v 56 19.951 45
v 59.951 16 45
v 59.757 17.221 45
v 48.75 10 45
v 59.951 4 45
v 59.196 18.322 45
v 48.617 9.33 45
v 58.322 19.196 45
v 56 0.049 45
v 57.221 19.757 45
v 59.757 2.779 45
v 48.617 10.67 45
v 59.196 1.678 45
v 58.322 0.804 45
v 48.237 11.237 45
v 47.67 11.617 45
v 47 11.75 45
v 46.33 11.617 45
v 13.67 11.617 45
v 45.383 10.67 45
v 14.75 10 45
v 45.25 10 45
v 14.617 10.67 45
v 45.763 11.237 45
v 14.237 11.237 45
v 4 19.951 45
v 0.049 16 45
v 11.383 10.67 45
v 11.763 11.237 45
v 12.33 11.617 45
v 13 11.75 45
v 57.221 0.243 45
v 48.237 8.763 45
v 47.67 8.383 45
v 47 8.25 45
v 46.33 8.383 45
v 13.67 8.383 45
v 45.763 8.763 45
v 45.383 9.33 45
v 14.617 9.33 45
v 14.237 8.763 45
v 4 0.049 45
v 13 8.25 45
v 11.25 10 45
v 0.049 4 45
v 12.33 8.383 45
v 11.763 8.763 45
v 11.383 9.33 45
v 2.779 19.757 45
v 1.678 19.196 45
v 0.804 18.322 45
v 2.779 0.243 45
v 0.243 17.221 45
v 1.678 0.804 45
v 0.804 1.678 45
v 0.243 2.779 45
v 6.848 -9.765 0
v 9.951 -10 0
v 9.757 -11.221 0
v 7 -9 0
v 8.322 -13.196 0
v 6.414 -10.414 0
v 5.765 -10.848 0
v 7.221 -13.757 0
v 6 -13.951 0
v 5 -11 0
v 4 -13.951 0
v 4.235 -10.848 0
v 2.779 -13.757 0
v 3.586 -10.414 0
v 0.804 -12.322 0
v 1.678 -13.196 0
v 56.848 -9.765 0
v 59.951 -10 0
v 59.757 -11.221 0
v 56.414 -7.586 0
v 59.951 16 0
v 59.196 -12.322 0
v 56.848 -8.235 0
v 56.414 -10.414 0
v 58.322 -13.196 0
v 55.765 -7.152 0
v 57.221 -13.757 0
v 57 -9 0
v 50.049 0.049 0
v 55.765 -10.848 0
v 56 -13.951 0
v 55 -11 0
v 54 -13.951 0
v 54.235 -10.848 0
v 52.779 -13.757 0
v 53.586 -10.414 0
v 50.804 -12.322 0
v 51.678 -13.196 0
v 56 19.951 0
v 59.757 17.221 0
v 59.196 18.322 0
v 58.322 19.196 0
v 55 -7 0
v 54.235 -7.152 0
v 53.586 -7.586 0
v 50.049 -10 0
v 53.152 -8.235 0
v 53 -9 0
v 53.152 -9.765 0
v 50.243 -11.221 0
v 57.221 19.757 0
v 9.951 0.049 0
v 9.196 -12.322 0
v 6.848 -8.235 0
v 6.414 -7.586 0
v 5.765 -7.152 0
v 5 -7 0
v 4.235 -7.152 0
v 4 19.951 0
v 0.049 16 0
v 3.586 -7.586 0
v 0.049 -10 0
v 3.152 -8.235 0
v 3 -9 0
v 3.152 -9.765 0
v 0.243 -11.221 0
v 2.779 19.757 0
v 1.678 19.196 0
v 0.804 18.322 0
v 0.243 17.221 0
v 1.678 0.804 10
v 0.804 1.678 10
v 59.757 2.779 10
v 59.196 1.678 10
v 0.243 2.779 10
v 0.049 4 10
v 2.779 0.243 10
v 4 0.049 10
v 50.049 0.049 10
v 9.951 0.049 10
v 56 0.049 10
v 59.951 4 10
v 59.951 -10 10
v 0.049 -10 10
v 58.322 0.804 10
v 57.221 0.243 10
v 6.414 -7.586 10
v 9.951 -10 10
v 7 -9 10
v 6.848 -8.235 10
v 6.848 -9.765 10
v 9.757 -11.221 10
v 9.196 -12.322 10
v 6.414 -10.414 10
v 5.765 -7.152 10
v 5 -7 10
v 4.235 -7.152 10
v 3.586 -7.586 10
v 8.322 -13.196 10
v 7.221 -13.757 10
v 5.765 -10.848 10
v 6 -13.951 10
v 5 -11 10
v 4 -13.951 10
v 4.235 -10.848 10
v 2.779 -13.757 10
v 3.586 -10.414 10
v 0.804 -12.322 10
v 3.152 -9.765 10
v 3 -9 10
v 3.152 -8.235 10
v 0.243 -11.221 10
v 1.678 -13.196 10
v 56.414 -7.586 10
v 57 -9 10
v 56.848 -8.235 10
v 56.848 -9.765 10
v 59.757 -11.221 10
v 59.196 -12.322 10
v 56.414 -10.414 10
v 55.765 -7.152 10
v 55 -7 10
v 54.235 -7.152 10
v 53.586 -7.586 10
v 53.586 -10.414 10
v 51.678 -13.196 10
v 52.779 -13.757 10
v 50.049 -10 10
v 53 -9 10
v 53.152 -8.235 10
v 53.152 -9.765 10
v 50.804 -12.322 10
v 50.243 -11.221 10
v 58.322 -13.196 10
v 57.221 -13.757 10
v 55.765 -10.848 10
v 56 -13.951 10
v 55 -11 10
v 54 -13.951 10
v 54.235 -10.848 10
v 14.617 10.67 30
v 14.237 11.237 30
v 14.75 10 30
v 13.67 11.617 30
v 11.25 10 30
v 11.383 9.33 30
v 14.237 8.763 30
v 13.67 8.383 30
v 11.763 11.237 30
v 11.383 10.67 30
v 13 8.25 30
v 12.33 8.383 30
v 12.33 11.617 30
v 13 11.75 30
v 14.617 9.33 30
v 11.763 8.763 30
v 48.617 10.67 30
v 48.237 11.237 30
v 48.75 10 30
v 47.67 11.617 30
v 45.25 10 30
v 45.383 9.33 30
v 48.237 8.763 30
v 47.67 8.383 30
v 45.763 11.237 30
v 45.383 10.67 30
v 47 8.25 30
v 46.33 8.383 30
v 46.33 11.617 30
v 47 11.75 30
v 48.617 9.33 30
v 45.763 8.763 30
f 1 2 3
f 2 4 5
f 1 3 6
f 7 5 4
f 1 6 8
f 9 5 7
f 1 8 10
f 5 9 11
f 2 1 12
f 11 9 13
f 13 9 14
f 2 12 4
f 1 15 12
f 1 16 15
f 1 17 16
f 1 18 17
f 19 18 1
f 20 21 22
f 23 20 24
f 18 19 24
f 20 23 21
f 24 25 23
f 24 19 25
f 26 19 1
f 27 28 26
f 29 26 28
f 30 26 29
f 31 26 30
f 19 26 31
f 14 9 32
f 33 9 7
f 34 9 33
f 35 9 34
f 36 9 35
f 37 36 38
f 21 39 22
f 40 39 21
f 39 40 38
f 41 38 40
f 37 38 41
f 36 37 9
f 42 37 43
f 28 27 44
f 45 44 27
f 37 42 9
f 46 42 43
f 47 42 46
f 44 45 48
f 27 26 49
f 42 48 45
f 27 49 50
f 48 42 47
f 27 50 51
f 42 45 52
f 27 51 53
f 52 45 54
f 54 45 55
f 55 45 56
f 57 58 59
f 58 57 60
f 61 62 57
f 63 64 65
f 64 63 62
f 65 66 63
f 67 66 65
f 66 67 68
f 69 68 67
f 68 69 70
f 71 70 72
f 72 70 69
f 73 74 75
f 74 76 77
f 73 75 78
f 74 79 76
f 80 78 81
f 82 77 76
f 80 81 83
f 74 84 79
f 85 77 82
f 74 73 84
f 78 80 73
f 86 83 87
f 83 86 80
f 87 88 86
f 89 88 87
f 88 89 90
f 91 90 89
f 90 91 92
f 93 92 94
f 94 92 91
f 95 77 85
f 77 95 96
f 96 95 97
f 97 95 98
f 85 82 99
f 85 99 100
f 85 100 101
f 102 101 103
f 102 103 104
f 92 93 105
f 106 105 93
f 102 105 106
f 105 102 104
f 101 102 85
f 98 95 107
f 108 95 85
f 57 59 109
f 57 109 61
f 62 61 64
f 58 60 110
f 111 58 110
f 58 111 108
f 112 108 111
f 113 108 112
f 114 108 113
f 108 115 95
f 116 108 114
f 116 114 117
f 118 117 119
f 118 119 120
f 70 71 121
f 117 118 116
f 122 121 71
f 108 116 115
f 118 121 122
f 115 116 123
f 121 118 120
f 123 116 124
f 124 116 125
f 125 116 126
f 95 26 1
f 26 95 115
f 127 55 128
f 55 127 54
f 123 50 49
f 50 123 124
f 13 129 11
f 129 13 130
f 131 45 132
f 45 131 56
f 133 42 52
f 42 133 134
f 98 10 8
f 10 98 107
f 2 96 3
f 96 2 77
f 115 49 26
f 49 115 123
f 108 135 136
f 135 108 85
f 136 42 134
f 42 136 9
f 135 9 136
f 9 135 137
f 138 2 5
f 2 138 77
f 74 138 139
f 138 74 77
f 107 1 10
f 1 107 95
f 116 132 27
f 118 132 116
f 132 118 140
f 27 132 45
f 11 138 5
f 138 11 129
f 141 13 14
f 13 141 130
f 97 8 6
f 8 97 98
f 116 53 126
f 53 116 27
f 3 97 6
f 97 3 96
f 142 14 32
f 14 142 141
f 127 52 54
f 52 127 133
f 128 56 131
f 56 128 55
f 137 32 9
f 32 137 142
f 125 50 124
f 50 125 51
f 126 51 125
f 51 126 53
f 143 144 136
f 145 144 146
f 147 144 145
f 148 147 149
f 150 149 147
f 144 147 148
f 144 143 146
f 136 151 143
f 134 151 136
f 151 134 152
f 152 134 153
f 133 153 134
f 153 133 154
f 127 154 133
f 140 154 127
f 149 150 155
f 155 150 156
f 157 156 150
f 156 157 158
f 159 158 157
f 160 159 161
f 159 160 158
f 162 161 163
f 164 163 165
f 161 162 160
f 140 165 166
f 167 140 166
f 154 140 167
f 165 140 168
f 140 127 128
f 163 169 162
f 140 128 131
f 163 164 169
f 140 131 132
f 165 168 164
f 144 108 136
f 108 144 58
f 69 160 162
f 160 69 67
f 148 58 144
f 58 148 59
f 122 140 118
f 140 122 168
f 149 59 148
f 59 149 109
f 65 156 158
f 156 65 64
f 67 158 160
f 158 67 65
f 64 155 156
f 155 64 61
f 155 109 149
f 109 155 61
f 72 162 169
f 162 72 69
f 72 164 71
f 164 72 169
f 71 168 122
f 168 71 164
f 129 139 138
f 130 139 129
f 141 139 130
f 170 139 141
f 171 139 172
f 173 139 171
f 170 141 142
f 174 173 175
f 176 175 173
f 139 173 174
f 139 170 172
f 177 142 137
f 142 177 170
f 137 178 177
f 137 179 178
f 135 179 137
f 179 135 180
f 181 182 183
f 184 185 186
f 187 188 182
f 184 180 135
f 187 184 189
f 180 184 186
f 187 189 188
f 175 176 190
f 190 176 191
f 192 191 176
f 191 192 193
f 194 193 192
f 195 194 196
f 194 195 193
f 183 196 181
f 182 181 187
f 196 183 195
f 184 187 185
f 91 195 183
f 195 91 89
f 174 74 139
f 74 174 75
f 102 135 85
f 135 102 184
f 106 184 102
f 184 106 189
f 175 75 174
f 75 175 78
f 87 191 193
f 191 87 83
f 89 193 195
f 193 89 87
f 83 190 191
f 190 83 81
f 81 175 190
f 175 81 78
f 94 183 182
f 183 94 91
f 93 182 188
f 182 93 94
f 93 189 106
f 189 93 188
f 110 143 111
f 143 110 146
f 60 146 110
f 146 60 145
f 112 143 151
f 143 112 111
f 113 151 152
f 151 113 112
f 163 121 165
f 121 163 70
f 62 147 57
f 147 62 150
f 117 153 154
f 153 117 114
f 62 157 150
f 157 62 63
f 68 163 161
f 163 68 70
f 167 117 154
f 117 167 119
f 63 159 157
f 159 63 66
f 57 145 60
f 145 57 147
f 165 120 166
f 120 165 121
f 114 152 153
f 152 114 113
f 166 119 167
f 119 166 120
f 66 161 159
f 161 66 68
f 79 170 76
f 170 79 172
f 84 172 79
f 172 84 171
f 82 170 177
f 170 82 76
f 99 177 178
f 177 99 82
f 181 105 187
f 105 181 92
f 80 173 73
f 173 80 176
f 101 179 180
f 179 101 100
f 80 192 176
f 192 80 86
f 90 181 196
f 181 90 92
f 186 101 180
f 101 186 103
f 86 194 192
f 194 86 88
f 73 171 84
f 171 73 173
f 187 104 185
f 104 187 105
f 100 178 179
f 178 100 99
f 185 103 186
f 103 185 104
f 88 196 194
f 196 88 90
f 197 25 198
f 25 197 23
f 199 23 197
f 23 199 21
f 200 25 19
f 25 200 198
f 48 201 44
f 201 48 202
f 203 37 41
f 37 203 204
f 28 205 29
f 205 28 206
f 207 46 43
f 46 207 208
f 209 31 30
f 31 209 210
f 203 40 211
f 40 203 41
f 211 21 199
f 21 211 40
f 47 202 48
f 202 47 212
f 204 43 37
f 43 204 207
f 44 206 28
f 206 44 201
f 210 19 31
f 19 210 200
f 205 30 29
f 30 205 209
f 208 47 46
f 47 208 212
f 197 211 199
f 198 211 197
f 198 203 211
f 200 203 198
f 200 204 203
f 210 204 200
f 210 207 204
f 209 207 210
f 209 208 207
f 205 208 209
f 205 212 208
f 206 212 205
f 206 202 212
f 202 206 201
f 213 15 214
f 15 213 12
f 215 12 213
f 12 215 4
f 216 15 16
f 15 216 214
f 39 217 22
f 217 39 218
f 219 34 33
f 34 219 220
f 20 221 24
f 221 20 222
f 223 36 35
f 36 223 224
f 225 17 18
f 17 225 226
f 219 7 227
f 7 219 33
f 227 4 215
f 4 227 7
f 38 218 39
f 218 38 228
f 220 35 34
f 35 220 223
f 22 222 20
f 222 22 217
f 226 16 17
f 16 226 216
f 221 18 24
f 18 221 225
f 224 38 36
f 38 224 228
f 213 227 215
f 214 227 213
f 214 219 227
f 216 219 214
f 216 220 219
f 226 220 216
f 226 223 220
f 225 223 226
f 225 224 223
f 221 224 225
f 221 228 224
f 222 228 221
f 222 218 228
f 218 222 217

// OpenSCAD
cylh=80;
//mirror([0,0,1]) base();
small_box();
module small_box() {
  difference(){
    union(){
      intersection(){
        cube([60,20,45]);
        minkowski(){
          translate([4,4]) cube([52,12,45]);
          sphere(4,$fn=20);
        }
      }
      translate([0,-14]) intersection(){
        cube([10,18,10]);
        minkowski(){
          translate([4,4]) cube([2,18,10]);
          sphere(4,$fn=20);
        }
      }
      translate([50,-14]) intersection(){
        cube([10,18,10]);
        minkowski(){
          translate([4,4]) cube([2,18,10]);
          sphere(4,$fn=20);
        }
      }
    }
    translate([5,-9,-.01]) cylinder(d=4,h=12,$fn=16);
    translate([55,-9,-.01]) cylinder(d=4,h=12,$fn=16);
    translate([13,10,30]) cylinder(d=3.5,h=20,$fn=16);
    translate([47,10,30]) cylinder(d=3.5,h=20,$fn=16);
  }
  %translate([13,10,69]) mirror([0,0,1]) small_cyl();
  %translate([47,10,69]) mirror([0,0,1]) small_cyl();
}
module small_cyl() {
  difference(){
    union(){
    cylinder(d=30, h=2, $fn=50);
    translate([0,0,2]) cylinder(d1=24,d2=12,h=10,$fn=40);
    translate([0,0,4]) cylinder(d=12,h=20,$fn=30);
      translate([0,0,16]) cylinder(d1=12,d2=15,h=8,$fn=36);
    }
    translate([0,0,-.01]) cylinder(d=5,h=40,$fn=20);
  }
}
module props() {
%translate([0,0,7]) bearing608();
%union(){
  cylinder(d=8,h=67,$fn=20);
}
}
module cyl(){
translate([0,0,14])
  difference()
  {
    cylinder2([[30,4,30],[30,8,25],[25,2,22],[22,cylh-28,22],[22,2,25],[25,8,30],[30,4,30]]);
    translate([0,0,-.01])
      cylinder2([[23,6,23],[23,6,20],
        [20,cylh-24,20],[20,6,23],[23,6.02,23]]);
  }
*difference()
{
  union(){
    cylinder(d=25,h=cylh);
    cylinder(d1=30,d2=25,h=8);
    translate([0,0,cylh-8]) cylinder(d1=25,d2=30,h=8);
  }
  translate([0,0,-.01]) cylinder(d=22.4,h=6);
  translate([0,0,5.98]) cylinder(d1=22.4,d2=22,h=8);
  translate([0,0,-.01]) cylinder(d=20,h=cylh+10);
  translate([0,0,cylh-14]) cylinder(d1=20,d2=22.4,h=8.01);
  translate([0,0,cylh-6]) cylinder(d=22.4,h=6.02);
}
}
module base(){
  bw=36;
difference(){
  union(){
    translate([bw*-.5,bw*-.5]) intersection(){
      cube([bw,bw,10]);
      minkowski(){
        translate([2,2,0]) cube([bw-4,bw-4,10]);
        sphere(2,$fn=20);
      }
    }
    *translate([0,0,6]) cylinder(d=14,h=1);
  }
  translate([0,0,-.01]) cylinder(d=15,h=5.4,$fn=6);
  cylinder(d=8.1,h=20,$fn=20);
  translate([0,-6.5,-.01]) cube([40,13,5.4]);
  translate([0,-4,5.38]) cube([40,8,6]);
  //translate([0,0,1]) cylinder(d=22,h=8,$fn=50);
  translate([bw*-.35,bw*-.35,-.01]) cylinder(d=3.5,h=20,$fn=16);
  translate([bw*-.35,bw*.35,-.01]) cylinder(d=3.5,h=20,$fn=16);
  translate([bw*.35,bw*-.35,-.01]) cylinder(d=3.5,h=20,$fn=16);
  translate([bw*.35,bw*.35,-.01]) cylinder(d=3.5,h=20,$fn=16);
  
}
}
module bearing608(){
difference(){
  cylinder(d=22,h=7,$fn=40);
  translate([0,0,-.01]) cylinder(d=8,h=7.02,$fn=20);
}
}
function sum(list,index,off=0) = (index > 0 ? sum(list,index-1,off) : 0) + list[index][off];
module cylinder2(ca) // [[d1A,hA,d2A],[dB,hB],...]
{
  for(i=[0:len(ca)-1])
  {
    z=sum(ca,i-1,1);
    echo(str("Height: ",ca[i][1]," @ ",z));
    translate([0,0,z]) cylinder(d1=ca[i][0],d2=len(ca[i])>2?ca[i][2]:0,h=ca[i][1],$fn=ca[i][0]*2);
  }
}
